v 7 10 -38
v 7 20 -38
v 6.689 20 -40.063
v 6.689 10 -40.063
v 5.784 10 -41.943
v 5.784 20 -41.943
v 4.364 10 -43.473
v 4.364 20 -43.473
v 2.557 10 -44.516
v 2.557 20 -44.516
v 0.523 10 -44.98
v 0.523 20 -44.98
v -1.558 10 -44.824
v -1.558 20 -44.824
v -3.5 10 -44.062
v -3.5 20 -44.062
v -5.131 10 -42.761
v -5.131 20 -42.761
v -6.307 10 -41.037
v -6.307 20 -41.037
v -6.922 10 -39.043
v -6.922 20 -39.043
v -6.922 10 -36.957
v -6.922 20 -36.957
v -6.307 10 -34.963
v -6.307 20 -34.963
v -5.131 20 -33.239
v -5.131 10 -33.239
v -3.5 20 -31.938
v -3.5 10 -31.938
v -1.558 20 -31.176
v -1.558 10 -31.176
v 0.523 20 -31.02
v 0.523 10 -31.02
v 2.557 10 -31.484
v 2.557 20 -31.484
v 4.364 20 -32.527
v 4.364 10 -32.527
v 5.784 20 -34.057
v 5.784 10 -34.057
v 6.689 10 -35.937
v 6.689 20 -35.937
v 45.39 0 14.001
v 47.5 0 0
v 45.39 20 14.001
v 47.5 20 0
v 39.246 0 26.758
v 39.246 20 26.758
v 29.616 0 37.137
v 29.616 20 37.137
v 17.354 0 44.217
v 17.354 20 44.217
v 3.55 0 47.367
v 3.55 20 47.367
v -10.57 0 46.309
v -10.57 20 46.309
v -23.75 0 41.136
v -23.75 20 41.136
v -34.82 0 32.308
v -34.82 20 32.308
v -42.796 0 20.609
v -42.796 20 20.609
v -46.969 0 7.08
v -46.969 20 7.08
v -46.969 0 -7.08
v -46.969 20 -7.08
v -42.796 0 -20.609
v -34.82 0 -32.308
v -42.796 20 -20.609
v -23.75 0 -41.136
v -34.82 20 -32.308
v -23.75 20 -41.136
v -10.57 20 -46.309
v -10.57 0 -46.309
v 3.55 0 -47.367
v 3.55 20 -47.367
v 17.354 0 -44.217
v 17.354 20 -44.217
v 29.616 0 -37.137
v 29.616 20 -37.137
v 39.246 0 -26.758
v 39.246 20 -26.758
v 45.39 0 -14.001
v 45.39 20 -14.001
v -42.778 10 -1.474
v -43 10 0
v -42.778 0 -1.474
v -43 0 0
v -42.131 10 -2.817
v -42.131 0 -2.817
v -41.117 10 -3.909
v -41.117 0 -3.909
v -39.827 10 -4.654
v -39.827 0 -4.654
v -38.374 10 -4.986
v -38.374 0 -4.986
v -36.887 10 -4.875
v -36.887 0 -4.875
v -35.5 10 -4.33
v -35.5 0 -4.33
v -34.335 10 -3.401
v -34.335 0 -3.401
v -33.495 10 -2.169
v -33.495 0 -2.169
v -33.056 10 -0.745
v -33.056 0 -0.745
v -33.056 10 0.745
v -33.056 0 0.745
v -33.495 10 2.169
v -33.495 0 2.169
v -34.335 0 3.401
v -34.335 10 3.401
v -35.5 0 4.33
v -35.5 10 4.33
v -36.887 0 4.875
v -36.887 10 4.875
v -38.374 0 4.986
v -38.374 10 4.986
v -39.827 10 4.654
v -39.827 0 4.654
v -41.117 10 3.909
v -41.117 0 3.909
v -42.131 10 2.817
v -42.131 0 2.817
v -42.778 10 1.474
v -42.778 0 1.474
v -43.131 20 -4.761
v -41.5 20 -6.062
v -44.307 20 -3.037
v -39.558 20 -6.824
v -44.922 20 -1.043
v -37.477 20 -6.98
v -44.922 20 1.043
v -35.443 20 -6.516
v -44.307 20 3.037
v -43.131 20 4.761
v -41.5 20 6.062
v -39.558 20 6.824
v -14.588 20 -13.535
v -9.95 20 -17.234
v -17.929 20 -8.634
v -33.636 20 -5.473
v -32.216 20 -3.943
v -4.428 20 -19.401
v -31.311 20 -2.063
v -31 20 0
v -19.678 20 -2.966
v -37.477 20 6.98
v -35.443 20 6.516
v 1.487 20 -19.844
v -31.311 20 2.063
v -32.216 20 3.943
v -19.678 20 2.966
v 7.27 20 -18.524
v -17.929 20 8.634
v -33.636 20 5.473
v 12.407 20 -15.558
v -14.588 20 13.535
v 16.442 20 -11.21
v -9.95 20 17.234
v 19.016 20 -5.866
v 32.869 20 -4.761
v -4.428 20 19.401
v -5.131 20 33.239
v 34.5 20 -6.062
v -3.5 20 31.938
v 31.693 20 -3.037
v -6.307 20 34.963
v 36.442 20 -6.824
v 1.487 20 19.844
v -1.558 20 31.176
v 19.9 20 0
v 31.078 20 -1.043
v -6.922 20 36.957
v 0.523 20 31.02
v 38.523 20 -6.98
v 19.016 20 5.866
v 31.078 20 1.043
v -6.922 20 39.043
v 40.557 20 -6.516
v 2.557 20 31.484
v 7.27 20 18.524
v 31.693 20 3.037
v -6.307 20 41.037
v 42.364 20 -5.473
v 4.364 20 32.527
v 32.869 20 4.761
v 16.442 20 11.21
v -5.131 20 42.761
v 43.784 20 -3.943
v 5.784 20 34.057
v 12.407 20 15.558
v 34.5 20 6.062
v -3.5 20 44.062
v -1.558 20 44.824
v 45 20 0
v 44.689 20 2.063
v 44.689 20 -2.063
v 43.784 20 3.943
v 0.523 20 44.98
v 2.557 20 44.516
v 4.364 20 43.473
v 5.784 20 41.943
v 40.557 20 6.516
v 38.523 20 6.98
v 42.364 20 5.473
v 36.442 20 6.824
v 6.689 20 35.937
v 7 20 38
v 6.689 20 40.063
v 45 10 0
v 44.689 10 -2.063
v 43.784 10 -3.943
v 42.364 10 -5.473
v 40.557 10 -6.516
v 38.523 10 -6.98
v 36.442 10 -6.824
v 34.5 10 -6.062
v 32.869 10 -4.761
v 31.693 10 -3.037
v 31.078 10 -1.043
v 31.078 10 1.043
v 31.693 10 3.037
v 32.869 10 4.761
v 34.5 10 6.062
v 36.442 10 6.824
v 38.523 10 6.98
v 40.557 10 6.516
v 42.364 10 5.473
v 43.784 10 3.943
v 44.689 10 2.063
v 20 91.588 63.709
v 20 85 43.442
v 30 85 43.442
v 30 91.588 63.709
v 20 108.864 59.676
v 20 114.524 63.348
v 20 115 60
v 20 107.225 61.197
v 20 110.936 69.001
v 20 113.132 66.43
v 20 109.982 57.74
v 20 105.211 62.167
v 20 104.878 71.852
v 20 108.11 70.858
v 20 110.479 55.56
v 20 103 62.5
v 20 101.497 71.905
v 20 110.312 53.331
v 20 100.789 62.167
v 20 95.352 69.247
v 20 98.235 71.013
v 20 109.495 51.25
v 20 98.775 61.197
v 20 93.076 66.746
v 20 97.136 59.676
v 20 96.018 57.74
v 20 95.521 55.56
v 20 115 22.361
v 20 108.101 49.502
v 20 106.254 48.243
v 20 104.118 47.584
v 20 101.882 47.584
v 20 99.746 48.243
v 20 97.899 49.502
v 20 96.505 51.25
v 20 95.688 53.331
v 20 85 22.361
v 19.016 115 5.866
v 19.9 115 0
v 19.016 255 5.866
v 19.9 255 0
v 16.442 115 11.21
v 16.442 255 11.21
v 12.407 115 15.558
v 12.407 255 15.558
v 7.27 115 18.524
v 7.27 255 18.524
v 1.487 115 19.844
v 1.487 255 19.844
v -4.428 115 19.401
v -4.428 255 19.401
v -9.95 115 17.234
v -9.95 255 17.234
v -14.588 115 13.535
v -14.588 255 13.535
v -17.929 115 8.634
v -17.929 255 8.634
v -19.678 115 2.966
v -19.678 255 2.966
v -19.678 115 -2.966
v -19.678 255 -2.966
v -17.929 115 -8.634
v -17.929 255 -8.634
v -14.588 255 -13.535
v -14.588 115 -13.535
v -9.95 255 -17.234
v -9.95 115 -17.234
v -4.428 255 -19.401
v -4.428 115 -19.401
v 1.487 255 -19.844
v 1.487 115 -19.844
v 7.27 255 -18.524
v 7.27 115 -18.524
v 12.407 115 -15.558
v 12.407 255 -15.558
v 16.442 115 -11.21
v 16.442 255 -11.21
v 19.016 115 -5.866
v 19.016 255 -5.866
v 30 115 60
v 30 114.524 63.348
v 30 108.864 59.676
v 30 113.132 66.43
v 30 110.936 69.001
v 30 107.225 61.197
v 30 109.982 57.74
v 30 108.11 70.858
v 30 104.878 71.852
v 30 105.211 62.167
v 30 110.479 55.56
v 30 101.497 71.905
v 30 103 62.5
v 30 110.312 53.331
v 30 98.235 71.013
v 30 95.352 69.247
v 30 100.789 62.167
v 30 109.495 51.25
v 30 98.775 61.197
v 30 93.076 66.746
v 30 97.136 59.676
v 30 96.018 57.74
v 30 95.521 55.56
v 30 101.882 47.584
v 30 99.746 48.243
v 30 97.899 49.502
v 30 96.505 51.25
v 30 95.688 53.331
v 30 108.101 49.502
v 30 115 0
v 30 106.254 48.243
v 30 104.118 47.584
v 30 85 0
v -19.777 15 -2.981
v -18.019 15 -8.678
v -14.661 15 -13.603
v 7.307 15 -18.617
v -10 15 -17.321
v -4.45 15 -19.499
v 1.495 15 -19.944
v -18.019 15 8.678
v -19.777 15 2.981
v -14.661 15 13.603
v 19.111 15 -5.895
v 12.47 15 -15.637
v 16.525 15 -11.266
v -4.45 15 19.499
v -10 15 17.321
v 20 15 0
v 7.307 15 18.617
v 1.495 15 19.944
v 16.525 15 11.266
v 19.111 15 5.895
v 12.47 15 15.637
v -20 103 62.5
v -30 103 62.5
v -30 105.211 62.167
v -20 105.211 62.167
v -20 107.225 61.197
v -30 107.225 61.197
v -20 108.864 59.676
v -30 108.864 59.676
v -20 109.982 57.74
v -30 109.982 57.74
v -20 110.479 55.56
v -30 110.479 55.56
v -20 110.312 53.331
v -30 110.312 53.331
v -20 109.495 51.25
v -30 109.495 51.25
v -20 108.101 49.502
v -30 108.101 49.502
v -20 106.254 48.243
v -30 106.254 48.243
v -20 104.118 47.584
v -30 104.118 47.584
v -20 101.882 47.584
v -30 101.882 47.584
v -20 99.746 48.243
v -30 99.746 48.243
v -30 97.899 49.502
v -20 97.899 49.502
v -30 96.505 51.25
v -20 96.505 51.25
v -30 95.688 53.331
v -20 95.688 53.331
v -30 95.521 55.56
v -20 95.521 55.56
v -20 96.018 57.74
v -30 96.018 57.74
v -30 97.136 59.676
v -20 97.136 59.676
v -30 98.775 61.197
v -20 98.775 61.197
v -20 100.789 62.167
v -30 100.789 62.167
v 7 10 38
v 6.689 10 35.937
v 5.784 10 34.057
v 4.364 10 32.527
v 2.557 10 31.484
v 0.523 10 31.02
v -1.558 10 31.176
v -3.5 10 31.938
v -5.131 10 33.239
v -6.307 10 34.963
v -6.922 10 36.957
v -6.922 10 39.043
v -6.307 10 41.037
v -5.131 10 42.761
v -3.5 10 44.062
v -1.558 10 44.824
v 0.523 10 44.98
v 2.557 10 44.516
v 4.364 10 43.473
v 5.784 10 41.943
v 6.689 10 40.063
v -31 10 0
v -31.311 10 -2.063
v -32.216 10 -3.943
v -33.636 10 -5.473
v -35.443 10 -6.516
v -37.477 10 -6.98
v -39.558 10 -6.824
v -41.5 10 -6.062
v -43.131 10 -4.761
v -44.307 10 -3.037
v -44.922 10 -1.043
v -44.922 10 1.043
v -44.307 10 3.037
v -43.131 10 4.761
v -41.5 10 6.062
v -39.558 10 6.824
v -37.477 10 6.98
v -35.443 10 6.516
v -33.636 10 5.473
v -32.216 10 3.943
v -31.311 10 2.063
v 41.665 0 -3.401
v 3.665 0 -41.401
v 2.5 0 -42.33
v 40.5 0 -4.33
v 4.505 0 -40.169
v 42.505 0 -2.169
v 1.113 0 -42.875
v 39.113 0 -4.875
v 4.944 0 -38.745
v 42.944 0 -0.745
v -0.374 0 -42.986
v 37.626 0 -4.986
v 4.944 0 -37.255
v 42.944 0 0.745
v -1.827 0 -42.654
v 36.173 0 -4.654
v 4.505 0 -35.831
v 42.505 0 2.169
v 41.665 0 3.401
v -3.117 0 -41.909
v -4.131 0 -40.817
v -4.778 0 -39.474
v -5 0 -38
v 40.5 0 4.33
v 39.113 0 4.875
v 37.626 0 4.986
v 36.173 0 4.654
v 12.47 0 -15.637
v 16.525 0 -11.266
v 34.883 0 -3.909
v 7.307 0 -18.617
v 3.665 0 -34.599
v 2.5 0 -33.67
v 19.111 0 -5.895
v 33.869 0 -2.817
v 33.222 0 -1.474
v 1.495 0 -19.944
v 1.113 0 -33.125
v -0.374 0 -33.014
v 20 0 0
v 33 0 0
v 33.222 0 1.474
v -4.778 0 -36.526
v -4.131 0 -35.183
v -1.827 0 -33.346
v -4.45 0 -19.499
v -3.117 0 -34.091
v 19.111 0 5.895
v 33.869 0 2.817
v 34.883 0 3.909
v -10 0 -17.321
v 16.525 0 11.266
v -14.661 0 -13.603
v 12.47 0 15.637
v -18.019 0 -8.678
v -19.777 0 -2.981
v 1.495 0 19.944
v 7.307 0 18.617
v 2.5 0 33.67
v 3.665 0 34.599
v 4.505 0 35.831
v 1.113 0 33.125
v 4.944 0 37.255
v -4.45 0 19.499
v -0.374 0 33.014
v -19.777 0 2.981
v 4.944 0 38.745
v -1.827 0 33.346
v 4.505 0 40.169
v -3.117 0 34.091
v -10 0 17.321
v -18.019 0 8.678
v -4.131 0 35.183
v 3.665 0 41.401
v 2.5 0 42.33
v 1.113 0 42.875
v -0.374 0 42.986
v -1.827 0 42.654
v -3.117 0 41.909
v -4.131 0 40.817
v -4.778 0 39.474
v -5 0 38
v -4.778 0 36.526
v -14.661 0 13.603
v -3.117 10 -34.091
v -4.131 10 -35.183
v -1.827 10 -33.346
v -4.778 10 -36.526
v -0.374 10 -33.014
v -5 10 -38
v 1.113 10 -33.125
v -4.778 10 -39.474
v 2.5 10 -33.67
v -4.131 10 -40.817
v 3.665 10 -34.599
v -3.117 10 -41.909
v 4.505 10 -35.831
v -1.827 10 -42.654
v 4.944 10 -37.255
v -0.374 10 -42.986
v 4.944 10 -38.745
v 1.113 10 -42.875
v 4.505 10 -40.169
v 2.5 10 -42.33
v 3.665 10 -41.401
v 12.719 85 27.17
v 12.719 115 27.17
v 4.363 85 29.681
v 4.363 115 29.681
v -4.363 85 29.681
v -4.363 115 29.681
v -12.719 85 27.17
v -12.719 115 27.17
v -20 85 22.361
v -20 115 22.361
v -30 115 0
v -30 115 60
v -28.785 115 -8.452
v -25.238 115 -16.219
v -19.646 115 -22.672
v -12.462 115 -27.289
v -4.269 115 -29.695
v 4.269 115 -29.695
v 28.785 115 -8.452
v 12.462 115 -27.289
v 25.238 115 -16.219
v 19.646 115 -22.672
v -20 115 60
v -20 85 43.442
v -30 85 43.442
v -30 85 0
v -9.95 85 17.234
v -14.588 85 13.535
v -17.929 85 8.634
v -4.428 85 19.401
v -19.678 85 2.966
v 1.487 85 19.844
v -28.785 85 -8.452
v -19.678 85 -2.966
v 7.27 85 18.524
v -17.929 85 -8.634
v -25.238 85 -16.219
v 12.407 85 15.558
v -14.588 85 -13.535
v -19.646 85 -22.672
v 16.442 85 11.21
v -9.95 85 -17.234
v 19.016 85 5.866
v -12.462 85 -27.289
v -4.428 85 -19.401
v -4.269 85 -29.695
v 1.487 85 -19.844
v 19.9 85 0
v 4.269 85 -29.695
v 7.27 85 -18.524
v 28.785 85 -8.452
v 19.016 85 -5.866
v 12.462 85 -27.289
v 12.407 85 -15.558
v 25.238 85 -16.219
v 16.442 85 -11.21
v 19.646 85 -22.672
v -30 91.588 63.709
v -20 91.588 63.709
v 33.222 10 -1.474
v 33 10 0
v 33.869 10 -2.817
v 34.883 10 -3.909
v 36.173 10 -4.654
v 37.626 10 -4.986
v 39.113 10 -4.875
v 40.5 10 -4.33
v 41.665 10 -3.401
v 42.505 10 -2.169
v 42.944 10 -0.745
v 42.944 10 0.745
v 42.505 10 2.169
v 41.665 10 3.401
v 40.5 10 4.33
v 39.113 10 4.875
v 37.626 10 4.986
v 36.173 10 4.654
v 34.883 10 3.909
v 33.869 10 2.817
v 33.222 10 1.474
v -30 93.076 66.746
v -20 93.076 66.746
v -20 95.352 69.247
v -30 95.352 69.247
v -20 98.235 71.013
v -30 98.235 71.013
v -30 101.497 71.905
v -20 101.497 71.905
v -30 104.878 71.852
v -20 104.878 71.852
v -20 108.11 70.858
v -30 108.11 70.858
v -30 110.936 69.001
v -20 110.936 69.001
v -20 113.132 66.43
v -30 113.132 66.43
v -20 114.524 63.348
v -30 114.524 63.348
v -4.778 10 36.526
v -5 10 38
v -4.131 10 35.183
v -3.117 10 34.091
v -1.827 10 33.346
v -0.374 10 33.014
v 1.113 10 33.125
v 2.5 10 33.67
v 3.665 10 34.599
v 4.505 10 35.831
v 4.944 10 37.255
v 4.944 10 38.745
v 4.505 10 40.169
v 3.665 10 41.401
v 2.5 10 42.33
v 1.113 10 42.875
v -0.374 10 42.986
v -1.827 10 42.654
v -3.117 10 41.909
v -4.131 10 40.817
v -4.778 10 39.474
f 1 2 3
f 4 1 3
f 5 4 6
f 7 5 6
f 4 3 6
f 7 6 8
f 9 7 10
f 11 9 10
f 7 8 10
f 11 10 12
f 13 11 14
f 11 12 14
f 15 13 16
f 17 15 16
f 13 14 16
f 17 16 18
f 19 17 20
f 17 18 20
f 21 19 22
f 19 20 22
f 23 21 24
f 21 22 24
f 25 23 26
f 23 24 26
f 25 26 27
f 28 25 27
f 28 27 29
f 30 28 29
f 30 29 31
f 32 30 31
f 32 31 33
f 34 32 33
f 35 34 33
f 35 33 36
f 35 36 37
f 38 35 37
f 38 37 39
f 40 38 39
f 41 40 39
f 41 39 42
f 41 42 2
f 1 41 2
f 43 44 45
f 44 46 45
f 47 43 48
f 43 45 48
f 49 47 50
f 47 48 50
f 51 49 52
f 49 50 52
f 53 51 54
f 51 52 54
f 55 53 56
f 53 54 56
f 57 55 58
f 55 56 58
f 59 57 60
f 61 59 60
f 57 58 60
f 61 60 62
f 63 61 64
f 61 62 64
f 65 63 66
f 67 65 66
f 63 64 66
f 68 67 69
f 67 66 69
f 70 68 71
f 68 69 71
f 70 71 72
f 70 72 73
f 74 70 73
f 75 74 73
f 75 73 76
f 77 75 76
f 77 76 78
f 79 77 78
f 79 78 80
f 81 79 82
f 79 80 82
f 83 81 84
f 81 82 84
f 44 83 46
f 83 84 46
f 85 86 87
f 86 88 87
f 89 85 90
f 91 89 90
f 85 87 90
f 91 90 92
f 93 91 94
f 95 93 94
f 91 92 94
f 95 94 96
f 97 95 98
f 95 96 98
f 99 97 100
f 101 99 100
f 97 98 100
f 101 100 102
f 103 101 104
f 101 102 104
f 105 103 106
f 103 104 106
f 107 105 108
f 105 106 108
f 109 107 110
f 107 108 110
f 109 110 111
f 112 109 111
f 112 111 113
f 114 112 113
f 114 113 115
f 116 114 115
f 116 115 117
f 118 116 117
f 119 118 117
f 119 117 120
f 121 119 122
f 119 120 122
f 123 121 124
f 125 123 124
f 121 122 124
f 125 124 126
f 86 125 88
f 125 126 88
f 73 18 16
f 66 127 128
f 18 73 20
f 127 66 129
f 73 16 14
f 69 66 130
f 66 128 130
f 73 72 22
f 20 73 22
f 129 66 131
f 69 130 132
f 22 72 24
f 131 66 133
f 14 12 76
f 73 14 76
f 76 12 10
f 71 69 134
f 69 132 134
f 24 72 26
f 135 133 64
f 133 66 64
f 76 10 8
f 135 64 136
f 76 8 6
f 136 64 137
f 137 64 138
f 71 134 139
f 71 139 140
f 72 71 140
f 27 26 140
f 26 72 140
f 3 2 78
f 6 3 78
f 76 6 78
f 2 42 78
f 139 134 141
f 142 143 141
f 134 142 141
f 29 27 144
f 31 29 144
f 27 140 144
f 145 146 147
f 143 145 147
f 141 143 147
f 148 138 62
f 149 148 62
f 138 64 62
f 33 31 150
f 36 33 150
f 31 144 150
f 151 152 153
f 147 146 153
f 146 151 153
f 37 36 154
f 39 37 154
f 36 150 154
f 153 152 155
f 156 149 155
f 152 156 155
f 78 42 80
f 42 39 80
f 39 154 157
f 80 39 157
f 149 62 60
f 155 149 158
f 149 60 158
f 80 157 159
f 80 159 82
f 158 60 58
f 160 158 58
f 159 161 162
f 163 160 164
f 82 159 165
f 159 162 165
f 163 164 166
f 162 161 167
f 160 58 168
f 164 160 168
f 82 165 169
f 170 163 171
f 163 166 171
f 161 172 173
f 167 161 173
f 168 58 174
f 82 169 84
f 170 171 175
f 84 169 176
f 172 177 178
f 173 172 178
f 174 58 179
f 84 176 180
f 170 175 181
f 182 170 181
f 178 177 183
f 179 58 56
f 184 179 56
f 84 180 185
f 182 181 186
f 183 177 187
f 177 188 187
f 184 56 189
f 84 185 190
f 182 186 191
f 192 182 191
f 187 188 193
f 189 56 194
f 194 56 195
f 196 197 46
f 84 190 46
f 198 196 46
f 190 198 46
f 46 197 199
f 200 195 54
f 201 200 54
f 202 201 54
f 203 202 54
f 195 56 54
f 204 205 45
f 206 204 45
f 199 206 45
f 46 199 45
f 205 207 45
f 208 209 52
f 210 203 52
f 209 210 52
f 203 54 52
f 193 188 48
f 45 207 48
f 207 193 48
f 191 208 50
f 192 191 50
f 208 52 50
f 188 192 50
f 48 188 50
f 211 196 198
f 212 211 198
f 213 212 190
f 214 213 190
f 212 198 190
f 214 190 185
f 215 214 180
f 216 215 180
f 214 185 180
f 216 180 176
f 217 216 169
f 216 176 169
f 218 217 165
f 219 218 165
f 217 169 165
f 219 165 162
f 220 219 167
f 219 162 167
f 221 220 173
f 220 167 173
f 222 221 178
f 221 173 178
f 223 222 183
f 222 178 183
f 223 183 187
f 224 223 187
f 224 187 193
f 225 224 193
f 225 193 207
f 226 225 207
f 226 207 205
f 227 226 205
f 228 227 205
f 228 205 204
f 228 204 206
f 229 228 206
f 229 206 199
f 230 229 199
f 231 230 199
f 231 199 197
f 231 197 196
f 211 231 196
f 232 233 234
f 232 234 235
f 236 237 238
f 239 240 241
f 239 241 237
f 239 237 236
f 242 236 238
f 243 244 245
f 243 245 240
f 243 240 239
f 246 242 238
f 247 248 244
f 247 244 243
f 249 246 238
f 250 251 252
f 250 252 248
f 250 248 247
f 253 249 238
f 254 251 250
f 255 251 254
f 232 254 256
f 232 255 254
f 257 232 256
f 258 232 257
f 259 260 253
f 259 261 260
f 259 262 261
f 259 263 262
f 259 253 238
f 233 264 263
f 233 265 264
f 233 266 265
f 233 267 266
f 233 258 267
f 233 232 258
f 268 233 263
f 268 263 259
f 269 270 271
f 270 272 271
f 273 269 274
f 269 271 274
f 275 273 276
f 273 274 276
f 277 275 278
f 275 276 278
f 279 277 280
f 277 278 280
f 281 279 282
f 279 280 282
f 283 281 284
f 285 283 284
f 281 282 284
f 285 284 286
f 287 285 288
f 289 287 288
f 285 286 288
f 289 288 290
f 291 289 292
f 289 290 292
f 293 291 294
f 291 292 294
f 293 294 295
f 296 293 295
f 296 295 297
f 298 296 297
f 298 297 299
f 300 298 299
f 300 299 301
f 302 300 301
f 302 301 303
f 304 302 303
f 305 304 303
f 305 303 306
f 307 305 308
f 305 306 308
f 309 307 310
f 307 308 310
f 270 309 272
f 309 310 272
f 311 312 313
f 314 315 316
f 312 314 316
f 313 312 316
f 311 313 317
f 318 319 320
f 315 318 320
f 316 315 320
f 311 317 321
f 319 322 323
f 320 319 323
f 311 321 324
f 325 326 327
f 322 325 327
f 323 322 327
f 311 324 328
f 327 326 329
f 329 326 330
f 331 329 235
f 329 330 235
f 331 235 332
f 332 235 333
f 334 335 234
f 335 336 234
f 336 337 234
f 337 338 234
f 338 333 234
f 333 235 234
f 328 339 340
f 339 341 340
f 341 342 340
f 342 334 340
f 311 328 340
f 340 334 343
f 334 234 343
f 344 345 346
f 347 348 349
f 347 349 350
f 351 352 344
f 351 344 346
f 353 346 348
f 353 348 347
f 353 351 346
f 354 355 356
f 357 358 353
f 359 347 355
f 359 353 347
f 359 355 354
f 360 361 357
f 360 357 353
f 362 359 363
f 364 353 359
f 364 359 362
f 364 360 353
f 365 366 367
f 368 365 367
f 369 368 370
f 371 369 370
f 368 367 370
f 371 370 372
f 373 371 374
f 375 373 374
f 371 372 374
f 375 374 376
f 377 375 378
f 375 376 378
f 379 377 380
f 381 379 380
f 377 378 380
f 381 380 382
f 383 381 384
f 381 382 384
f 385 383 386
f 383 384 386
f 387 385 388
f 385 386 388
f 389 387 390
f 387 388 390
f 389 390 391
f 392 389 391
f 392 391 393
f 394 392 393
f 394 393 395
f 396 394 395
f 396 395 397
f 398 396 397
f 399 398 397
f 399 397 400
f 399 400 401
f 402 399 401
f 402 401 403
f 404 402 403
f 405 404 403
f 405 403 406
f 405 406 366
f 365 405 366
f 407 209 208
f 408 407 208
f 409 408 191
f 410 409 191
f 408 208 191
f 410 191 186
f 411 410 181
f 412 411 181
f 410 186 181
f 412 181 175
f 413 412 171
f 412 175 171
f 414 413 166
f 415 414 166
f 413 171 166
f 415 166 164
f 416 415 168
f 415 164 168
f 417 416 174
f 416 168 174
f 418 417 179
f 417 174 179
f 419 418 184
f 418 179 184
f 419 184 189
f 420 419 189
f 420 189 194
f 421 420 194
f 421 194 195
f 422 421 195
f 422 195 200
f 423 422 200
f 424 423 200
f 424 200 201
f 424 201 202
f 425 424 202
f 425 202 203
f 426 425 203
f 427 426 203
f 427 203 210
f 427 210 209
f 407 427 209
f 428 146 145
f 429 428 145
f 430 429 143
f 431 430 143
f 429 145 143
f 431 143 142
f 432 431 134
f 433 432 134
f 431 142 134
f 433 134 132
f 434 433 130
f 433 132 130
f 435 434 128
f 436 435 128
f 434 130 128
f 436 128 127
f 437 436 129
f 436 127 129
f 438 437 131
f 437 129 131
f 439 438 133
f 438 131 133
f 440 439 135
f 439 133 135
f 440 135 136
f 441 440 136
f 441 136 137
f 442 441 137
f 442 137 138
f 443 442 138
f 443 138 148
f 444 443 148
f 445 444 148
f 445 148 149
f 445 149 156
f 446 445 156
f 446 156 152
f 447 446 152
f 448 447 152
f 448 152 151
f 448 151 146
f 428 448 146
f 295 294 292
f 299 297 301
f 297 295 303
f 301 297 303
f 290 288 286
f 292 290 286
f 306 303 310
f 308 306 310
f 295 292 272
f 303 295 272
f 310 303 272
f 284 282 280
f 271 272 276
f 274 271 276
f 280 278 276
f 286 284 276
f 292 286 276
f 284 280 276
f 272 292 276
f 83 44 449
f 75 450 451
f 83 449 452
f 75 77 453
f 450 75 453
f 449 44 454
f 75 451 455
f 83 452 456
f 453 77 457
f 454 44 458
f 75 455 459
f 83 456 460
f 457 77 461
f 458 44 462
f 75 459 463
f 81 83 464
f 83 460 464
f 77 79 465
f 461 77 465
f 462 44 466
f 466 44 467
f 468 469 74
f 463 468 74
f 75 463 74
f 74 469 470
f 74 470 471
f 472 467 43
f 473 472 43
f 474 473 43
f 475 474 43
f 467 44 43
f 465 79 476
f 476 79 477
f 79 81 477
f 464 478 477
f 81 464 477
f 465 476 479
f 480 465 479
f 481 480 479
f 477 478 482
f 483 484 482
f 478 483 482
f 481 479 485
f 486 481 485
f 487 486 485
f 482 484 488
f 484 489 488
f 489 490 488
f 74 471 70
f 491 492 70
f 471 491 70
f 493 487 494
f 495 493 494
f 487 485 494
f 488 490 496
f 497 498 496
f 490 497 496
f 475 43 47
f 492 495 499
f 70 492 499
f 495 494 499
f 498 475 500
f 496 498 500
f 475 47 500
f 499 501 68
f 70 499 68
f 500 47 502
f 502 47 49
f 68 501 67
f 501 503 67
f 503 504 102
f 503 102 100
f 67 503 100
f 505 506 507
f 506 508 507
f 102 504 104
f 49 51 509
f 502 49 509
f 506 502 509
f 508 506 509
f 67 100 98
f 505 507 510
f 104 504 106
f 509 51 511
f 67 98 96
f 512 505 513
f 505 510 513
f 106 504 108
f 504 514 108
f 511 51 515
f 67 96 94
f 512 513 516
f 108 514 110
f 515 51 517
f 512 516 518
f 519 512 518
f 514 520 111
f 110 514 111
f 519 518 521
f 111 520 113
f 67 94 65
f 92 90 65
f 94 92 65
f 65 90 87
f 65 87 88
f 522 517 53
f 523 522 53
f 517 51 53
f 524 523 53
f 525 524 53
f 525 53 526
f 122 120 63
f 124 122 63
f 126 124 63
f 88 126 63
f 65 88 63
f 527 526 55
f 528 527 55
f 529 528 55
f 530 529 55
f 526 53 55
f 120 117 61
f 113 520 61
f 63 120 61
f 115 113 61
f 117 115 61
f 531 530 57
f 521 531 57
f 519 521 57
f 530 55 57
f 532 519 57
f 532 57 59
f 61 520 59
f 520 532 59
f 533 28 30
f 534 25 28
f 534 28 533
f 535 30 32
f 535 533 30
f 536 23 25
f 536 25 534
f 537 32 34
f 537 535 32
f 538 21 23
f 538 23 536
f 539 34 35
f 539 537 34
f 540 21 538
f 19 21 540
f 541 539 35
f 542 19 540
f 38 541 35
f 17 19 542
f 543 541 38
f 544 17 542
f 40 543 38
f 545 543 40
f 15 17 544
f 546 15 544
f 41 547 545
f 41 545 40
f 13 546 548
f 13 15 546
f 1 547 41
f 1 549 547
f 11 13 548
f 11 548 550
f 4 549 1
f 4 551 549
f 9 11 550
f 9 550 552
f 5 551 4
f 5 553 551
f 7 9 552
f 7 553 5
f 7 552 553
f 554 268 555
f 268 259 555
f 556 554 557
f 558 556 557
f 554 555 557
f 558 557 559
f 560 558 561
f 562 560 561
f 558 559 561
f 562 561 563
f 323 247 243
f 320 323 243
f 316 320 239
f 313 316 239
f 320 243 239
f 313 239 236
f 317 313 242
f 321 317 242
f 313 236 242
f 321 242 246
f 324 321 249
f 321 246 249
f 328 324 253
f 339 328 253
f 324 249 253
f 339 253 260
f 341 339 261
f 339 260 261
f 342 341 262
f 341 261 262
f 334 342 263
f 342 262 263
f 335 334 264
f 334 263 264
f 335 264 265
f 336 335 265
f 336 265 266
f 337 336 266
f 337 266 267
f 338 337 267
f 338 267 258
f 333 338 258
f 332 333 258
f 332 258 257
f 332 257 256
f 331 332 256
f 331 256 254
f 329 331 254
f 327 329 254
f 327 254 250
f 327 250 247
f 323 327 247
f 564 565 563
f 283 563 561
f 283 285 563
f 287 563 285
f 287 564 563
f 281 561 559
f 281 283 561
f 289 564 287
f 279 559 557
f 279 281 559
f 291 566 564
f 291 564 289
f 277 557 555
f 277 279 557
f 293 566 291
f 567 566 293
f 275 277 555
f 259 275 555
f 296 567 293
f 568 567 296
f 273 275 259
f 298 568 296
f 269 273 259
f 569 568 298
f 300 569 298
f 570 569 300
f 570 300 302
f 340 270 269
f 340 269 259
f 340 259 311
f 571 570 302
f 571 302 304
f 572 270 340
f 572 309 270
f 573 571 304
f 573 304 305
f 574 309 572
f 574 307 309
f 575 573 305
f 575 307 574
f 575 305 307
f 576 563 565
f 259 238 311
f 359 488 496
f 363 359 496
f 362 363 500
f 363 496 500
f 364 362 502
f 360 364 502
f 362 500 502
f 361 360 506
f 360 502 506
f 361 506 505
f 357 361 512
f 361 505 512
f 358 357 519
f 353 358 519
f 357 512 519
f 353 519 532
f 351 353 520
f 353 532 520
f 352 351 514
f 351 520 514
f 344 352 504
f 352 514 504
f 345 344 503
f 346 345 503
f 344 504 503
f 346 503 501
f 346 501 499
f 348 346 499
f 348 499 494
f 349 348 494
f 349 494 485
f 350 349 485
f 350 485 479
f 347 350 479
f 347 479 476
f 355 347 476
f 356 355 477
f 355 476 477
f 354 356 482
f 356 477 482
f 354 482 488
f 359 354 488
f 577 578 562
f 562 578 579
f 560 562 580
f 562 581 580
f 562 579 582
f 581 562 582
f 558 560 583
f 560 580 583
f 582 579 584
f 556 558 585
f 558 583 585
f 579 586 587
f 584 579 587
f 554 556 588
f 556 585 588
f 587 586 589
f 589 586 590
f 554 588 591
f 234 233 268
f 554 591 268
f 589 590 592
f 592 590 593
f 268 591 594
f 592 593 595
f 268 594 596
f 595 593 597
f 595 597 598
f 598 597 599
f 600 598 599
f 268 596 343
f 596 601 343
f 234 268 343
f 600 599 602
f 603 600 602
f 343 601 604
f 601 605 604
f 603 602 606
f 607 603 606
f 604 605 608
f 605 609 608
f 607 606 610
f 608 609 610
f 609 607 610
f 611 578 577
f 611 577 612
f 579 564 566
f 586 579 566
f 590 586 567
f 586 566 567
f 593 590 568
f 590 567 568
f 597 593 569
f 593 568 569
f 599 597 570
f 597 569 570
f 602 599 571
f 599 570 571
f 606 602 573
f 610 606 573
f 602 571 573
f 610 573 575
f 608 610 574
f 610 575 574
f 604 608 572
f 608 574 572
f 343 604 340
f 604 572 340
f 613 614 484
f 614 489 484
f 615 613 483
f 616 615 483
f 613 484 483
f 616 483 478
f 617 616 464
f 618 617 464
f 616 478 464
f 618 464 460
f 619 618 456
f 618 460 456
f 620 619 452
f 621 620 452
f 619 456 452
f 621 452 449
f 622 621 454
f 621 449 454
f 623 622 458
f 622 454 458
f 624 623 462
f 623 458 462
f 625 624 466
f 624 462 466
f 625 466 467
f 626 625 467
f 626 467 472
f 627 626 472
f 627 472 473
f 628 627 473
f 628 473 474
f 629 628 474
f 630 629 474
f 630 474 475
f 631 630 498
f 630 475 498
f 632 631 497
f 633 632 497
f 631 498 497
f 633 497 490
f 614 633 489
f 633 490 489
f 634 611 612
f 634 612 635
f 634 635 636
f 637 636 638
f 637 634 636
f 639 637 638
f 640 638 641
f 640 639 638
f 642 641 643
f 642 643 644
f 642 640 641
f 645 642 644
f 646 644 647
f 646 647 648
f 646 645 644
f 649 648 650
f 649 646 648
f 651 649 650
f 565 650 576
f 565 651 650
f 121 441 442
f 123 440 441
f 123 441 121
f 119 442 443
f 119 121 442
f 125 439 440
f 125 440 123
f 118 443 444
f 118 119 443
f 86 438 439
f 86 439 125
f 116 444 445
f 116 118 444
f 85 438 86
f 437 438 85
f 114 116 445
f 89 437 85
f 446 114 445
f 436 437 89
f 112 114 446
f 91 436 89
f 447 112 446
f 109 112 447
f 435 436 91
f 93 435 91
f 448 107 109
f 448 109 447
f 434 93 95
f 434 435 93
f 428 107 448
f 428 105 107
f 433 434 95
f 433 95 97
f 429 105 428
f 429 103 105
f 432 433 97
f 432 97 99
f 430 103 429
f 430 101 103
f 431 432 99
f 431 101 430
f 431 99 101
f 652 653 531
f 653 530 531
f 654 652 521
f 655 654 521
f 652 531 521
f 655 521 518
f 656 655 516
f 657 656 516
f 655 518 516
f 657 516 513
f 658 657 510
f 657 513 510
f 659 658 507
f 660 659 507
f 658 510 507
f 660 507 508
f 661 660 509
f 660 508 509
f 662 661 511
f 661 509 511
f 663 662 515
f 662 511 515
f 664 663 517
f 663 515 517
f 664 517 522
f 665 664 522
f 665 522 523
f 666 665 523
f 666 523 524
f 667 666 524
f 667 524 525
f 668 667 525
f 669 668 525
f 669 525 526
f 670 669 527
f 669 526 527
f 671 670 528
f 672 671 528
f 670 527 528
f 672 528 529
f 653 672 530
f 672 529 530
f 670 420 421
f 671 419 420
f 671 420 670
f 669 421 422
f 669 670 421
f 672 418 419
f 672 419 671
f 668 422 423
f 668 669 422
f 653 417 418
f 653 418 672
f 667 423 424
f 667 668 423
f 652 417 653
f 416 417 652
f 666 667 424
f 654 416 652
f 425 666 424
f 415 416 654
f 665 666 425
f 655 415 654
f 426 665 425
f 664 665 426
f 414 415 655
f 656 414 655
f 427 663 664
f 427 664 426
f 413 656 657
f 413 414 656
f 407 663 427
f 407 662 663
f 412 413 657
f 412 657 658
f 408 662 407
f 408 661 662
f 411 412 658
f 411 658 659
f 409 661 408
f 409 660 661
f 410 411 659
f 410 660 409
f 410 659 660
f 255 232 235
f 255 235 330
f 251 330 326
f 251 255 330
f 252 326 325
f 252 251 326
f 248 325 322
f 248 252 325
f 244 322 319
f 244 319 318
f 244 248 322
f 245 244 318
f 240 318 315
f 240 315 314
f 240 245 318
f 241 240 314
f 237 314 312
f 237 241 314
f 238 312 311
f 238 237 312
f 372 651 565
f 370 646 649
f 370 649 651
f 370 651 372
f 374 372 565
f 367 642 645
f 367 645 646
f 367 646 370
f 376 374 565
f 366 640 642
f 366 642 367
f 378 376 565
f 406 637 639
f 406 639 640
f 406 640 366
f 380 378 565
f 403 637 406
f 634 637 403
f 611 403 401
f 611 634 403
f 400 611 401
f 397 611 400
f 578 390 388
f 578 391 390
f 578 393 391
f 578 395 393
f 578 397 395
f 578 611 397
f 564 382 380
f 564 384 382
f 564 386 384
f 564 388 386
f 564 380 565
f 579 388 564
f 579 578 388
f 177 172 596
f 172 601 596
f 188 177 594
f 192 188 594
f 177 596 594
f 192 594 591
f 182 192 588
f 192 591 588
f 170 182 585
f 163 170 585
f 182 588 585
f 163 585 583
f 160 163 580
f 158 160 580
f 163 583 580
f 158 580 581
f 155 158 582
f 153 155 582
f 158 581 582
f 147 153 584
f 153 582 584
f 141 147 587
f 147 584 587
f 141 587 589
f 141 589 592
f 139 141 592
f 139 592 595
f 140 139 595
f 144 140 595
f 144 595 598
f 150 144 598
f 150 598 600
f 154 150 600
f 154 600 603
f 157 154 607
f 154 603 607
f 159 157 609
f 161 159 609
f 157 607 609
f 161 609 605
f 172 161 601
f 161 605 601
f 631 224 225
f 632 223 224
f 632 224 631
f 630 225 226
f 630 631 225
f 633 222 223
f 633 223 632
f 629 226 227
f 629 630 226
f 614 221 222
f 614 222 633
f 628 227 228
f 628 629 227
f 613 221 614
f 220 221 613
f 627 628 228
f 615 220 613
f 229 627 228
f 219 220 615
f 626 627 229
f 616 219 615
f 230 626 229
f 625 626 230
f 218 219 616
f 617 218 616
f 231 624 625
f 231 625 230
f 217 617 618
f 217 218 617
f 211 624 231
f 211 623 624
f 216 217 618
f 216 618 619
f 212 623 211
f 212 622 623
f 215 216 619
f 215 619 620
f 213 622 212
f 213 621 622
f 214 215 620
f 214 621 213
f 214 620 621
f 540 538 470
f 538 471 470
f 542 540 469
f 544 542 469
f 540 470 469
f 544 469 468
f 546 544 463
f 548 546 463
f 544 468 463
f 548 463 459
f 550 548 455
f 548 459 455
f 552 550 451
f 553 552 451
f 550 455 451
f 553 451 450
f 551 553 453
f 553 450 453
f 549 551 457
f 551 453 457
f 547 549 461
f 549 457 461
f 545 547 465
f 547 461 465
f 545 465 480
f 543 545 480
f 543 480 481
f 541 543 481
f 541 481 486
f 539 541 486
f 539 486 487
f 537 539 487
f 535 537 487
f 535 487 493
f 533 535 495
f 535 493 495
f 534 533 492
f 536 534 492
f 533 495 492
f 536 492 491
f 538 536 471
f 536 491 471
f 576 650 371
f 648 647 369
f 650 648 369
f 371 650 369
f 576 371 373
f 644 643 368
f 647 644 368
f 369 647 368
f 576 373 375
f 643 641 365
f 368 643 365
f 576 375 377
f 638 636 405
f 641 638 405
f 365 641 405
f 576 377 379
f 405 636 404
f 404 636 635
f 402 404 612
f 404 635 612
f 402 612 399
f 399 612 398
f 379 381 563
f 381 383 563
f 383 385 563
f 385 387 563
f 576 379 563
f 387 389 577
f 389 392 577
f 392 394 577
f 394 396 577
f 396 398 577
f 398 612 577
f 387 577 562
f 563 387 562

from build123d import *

# Parameters (mm, degrees)
SKETCH2_W           = 10
SKETCH2_H           = 80
BOSS_EXTRUDE1_DEPTH = 30
SKETCH3_R           = 7.5
CUT_EXTRUDE1_DEPTH  = 94
HOLE1_D             = 10
HOLE1_CBORE_D       = 14
HOLE1_CBORE_DEPTH   = 10
SKETCH8_R           = 20
CUT_EXTRUDE2_DEPTH  = 15


with BuildPart() as part:
    # Sketch1 → Revolve1 (revolve)
    with BuildSketch(Plane.XY):
        Polygon((0, 0), (47.5, 0), (47.5, 20), (19.9, 20), (19.9, 85), (30, 85), (30, 115), (19.9, 115), (19.9, 255), (0, 255), align=None)
    revolve(axis=Axis((0, 307.026159996, 0), (0, -1, 0)))

    # Sketch2 → Boss-Extrude1 (add)
    with BuildSketch(Plane(origin=(0, 85, 0), x_dir=(1, 0, 0), z_dir=(0, 1, 0))):
        with Locations((-25, -40)):
            Rectangle(SKETCH2_W, SKETCH2_H)
        with Locations((25, -40)):
            Rectangle(SKETCH2_W, SKETCH2_H)
    extrude(amount=BOSS_EXTRUDE1_DEPTH)

    # Sketch3 → Cut-Extrude1 (cut)
    with BuildSketch(Plane.ZY.offset(30)):
        with Locations((55, 103)):
            Circle(SKETCH3_R)
        with BuildLine():
            Line((43.44222057, 85), (63.709479612, 91.587736377))
            ThreePointArc((63.709479612, 91.587736377), (71.852155152, 104.877875997), (60, 115))
            Line((60, 115), (80, 115))
            Line((80, 115), (80, 85))
            Line((80, 85), (43.44222057, 85))
        make_face()
    extrude(amount=-CUT_EXTRUDE1_DEPTH, mode=Mode.SUBTRACT)

    # Hole1 (through all)
    with Locations(Plane(origin=(0, 20, 0), x_dir=(1, 0, 0), z_dir=(0, 1, 0))):
        with Locations((38, 0), (0, 38), (-38, 0), (0, -38)):
            CounterBoreHole(HOLE1_D / 2, HOLE1_CBORE_D / 2, HOLE1_CBORE_DEPTH)

    # Sketch8 → Cut-Extrude2 (cut)
    with BuildSketch(Plane.XZ):
        Circle(SKETCH8_R)
    extrude(amount=-CUT_EXTRUDE2_DEPTH, mode=Mode.SUBTRACT)


solid = part.part
